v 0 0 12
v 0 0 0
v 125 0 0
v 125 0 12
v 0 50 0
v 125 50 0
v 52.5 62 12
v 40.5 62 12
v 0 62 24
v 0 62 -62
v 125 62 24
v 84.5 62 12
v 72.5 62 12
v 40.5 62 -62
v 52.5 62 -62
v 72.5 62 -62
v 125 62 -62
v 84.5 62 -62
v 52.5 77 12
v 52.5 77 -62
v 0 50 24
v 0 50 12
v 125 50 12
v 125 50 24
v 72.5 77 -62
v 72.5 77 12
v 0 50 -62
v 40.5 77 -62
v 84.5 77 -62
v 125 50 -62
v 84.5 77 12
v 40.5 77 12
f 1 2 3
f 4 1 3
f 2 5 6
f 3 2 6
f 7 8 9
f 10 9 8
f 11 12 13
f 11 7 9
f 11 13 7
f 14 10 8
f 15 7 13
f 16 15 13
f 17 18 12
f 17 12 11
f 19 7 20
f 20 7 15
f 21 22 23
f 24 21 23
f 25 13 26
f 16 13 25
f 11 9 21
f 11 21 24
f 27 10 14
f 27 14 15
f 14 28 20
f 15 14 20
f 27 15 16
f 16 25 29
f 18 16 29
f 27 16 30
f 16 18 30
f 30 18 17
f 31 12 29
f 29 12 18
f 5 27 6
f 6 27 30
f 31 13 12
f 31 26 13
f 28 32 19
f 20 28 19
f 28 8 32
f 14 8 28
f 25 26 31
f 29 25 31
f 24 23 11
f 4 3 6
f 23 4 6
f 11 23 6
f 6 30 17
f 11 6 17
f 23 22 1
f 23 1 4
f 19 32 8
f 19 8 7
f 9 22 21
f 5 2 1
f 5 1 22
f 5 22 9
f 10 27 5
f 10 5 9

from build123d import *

# Parameters (mm, degrees)
SKETCH1_W           = 125
SKETCH1_H           = 62
BOSS_EXTRUDE2_DEPTH = 12
SKETCH3_W           = 125
SKETCH3_H           = 62
BOSS_EXTRUDE3_DEPTH = 12
SKETCH4_W           = 12
SKETCH4_H           = 74
BOSS_EXTRUDE4_DEPTH = 15
SKETCH5_W           = 125
SKETCH5_H           = 12
BOSS_EXTRUDE5_DEPTH = 12


with BuildPart() as part:
    # Sketch1 → Boss-Extrude2 (new body)
    with BuildSketch(Plane.XY):
        with Locations((62.5, 31)):
            Rectangle(SKETCH1_W, SKETCH1_H)
    extrude(amount=BOSS_EXTRUDE2_DEPTH)

    # Sketch3 → Boss-Extrude3 (add)
    with BuildSketch(Plane(origin=(0, 62, 0), x_dir=(1, 0, 0), z_dir=(0, 1, 0))):
        with Locations((62.5, 31)):
            Rectangle(SKETCH3_W, SKETCH3_H)
    extrude(amount=-BOSS_EXTRUDE3_DEPTH)

    # Sketch4 → Boss-Extrude4 (add)
    with BuildSketch(Plane(origin=(0, 62, 0), x_dir=(1, 0, 0), z_dir=(0, 1, 0))):
        with Locations((46.5, 25)):
            Rectangle(SKETCH4_W, SKETCH4_H)
        with Locations((78.5, 25)):
            Rectangle(SKETCH4_W, SKETCH4_H)
    extrude(amount=BOSS_EXTRUDE4_DEPTH)

    # Sketch5 → Boss-Extrude5 (add)
    with BuildSketch(Plane.XY.offset(12)):
        with Locations((62.5, 56)):
            Rectangle(SKETCH5_W, SKETCH5_H)
    extrude(amount=BOSS_EXTRUDE5_DEPTH)


solid = part.part
